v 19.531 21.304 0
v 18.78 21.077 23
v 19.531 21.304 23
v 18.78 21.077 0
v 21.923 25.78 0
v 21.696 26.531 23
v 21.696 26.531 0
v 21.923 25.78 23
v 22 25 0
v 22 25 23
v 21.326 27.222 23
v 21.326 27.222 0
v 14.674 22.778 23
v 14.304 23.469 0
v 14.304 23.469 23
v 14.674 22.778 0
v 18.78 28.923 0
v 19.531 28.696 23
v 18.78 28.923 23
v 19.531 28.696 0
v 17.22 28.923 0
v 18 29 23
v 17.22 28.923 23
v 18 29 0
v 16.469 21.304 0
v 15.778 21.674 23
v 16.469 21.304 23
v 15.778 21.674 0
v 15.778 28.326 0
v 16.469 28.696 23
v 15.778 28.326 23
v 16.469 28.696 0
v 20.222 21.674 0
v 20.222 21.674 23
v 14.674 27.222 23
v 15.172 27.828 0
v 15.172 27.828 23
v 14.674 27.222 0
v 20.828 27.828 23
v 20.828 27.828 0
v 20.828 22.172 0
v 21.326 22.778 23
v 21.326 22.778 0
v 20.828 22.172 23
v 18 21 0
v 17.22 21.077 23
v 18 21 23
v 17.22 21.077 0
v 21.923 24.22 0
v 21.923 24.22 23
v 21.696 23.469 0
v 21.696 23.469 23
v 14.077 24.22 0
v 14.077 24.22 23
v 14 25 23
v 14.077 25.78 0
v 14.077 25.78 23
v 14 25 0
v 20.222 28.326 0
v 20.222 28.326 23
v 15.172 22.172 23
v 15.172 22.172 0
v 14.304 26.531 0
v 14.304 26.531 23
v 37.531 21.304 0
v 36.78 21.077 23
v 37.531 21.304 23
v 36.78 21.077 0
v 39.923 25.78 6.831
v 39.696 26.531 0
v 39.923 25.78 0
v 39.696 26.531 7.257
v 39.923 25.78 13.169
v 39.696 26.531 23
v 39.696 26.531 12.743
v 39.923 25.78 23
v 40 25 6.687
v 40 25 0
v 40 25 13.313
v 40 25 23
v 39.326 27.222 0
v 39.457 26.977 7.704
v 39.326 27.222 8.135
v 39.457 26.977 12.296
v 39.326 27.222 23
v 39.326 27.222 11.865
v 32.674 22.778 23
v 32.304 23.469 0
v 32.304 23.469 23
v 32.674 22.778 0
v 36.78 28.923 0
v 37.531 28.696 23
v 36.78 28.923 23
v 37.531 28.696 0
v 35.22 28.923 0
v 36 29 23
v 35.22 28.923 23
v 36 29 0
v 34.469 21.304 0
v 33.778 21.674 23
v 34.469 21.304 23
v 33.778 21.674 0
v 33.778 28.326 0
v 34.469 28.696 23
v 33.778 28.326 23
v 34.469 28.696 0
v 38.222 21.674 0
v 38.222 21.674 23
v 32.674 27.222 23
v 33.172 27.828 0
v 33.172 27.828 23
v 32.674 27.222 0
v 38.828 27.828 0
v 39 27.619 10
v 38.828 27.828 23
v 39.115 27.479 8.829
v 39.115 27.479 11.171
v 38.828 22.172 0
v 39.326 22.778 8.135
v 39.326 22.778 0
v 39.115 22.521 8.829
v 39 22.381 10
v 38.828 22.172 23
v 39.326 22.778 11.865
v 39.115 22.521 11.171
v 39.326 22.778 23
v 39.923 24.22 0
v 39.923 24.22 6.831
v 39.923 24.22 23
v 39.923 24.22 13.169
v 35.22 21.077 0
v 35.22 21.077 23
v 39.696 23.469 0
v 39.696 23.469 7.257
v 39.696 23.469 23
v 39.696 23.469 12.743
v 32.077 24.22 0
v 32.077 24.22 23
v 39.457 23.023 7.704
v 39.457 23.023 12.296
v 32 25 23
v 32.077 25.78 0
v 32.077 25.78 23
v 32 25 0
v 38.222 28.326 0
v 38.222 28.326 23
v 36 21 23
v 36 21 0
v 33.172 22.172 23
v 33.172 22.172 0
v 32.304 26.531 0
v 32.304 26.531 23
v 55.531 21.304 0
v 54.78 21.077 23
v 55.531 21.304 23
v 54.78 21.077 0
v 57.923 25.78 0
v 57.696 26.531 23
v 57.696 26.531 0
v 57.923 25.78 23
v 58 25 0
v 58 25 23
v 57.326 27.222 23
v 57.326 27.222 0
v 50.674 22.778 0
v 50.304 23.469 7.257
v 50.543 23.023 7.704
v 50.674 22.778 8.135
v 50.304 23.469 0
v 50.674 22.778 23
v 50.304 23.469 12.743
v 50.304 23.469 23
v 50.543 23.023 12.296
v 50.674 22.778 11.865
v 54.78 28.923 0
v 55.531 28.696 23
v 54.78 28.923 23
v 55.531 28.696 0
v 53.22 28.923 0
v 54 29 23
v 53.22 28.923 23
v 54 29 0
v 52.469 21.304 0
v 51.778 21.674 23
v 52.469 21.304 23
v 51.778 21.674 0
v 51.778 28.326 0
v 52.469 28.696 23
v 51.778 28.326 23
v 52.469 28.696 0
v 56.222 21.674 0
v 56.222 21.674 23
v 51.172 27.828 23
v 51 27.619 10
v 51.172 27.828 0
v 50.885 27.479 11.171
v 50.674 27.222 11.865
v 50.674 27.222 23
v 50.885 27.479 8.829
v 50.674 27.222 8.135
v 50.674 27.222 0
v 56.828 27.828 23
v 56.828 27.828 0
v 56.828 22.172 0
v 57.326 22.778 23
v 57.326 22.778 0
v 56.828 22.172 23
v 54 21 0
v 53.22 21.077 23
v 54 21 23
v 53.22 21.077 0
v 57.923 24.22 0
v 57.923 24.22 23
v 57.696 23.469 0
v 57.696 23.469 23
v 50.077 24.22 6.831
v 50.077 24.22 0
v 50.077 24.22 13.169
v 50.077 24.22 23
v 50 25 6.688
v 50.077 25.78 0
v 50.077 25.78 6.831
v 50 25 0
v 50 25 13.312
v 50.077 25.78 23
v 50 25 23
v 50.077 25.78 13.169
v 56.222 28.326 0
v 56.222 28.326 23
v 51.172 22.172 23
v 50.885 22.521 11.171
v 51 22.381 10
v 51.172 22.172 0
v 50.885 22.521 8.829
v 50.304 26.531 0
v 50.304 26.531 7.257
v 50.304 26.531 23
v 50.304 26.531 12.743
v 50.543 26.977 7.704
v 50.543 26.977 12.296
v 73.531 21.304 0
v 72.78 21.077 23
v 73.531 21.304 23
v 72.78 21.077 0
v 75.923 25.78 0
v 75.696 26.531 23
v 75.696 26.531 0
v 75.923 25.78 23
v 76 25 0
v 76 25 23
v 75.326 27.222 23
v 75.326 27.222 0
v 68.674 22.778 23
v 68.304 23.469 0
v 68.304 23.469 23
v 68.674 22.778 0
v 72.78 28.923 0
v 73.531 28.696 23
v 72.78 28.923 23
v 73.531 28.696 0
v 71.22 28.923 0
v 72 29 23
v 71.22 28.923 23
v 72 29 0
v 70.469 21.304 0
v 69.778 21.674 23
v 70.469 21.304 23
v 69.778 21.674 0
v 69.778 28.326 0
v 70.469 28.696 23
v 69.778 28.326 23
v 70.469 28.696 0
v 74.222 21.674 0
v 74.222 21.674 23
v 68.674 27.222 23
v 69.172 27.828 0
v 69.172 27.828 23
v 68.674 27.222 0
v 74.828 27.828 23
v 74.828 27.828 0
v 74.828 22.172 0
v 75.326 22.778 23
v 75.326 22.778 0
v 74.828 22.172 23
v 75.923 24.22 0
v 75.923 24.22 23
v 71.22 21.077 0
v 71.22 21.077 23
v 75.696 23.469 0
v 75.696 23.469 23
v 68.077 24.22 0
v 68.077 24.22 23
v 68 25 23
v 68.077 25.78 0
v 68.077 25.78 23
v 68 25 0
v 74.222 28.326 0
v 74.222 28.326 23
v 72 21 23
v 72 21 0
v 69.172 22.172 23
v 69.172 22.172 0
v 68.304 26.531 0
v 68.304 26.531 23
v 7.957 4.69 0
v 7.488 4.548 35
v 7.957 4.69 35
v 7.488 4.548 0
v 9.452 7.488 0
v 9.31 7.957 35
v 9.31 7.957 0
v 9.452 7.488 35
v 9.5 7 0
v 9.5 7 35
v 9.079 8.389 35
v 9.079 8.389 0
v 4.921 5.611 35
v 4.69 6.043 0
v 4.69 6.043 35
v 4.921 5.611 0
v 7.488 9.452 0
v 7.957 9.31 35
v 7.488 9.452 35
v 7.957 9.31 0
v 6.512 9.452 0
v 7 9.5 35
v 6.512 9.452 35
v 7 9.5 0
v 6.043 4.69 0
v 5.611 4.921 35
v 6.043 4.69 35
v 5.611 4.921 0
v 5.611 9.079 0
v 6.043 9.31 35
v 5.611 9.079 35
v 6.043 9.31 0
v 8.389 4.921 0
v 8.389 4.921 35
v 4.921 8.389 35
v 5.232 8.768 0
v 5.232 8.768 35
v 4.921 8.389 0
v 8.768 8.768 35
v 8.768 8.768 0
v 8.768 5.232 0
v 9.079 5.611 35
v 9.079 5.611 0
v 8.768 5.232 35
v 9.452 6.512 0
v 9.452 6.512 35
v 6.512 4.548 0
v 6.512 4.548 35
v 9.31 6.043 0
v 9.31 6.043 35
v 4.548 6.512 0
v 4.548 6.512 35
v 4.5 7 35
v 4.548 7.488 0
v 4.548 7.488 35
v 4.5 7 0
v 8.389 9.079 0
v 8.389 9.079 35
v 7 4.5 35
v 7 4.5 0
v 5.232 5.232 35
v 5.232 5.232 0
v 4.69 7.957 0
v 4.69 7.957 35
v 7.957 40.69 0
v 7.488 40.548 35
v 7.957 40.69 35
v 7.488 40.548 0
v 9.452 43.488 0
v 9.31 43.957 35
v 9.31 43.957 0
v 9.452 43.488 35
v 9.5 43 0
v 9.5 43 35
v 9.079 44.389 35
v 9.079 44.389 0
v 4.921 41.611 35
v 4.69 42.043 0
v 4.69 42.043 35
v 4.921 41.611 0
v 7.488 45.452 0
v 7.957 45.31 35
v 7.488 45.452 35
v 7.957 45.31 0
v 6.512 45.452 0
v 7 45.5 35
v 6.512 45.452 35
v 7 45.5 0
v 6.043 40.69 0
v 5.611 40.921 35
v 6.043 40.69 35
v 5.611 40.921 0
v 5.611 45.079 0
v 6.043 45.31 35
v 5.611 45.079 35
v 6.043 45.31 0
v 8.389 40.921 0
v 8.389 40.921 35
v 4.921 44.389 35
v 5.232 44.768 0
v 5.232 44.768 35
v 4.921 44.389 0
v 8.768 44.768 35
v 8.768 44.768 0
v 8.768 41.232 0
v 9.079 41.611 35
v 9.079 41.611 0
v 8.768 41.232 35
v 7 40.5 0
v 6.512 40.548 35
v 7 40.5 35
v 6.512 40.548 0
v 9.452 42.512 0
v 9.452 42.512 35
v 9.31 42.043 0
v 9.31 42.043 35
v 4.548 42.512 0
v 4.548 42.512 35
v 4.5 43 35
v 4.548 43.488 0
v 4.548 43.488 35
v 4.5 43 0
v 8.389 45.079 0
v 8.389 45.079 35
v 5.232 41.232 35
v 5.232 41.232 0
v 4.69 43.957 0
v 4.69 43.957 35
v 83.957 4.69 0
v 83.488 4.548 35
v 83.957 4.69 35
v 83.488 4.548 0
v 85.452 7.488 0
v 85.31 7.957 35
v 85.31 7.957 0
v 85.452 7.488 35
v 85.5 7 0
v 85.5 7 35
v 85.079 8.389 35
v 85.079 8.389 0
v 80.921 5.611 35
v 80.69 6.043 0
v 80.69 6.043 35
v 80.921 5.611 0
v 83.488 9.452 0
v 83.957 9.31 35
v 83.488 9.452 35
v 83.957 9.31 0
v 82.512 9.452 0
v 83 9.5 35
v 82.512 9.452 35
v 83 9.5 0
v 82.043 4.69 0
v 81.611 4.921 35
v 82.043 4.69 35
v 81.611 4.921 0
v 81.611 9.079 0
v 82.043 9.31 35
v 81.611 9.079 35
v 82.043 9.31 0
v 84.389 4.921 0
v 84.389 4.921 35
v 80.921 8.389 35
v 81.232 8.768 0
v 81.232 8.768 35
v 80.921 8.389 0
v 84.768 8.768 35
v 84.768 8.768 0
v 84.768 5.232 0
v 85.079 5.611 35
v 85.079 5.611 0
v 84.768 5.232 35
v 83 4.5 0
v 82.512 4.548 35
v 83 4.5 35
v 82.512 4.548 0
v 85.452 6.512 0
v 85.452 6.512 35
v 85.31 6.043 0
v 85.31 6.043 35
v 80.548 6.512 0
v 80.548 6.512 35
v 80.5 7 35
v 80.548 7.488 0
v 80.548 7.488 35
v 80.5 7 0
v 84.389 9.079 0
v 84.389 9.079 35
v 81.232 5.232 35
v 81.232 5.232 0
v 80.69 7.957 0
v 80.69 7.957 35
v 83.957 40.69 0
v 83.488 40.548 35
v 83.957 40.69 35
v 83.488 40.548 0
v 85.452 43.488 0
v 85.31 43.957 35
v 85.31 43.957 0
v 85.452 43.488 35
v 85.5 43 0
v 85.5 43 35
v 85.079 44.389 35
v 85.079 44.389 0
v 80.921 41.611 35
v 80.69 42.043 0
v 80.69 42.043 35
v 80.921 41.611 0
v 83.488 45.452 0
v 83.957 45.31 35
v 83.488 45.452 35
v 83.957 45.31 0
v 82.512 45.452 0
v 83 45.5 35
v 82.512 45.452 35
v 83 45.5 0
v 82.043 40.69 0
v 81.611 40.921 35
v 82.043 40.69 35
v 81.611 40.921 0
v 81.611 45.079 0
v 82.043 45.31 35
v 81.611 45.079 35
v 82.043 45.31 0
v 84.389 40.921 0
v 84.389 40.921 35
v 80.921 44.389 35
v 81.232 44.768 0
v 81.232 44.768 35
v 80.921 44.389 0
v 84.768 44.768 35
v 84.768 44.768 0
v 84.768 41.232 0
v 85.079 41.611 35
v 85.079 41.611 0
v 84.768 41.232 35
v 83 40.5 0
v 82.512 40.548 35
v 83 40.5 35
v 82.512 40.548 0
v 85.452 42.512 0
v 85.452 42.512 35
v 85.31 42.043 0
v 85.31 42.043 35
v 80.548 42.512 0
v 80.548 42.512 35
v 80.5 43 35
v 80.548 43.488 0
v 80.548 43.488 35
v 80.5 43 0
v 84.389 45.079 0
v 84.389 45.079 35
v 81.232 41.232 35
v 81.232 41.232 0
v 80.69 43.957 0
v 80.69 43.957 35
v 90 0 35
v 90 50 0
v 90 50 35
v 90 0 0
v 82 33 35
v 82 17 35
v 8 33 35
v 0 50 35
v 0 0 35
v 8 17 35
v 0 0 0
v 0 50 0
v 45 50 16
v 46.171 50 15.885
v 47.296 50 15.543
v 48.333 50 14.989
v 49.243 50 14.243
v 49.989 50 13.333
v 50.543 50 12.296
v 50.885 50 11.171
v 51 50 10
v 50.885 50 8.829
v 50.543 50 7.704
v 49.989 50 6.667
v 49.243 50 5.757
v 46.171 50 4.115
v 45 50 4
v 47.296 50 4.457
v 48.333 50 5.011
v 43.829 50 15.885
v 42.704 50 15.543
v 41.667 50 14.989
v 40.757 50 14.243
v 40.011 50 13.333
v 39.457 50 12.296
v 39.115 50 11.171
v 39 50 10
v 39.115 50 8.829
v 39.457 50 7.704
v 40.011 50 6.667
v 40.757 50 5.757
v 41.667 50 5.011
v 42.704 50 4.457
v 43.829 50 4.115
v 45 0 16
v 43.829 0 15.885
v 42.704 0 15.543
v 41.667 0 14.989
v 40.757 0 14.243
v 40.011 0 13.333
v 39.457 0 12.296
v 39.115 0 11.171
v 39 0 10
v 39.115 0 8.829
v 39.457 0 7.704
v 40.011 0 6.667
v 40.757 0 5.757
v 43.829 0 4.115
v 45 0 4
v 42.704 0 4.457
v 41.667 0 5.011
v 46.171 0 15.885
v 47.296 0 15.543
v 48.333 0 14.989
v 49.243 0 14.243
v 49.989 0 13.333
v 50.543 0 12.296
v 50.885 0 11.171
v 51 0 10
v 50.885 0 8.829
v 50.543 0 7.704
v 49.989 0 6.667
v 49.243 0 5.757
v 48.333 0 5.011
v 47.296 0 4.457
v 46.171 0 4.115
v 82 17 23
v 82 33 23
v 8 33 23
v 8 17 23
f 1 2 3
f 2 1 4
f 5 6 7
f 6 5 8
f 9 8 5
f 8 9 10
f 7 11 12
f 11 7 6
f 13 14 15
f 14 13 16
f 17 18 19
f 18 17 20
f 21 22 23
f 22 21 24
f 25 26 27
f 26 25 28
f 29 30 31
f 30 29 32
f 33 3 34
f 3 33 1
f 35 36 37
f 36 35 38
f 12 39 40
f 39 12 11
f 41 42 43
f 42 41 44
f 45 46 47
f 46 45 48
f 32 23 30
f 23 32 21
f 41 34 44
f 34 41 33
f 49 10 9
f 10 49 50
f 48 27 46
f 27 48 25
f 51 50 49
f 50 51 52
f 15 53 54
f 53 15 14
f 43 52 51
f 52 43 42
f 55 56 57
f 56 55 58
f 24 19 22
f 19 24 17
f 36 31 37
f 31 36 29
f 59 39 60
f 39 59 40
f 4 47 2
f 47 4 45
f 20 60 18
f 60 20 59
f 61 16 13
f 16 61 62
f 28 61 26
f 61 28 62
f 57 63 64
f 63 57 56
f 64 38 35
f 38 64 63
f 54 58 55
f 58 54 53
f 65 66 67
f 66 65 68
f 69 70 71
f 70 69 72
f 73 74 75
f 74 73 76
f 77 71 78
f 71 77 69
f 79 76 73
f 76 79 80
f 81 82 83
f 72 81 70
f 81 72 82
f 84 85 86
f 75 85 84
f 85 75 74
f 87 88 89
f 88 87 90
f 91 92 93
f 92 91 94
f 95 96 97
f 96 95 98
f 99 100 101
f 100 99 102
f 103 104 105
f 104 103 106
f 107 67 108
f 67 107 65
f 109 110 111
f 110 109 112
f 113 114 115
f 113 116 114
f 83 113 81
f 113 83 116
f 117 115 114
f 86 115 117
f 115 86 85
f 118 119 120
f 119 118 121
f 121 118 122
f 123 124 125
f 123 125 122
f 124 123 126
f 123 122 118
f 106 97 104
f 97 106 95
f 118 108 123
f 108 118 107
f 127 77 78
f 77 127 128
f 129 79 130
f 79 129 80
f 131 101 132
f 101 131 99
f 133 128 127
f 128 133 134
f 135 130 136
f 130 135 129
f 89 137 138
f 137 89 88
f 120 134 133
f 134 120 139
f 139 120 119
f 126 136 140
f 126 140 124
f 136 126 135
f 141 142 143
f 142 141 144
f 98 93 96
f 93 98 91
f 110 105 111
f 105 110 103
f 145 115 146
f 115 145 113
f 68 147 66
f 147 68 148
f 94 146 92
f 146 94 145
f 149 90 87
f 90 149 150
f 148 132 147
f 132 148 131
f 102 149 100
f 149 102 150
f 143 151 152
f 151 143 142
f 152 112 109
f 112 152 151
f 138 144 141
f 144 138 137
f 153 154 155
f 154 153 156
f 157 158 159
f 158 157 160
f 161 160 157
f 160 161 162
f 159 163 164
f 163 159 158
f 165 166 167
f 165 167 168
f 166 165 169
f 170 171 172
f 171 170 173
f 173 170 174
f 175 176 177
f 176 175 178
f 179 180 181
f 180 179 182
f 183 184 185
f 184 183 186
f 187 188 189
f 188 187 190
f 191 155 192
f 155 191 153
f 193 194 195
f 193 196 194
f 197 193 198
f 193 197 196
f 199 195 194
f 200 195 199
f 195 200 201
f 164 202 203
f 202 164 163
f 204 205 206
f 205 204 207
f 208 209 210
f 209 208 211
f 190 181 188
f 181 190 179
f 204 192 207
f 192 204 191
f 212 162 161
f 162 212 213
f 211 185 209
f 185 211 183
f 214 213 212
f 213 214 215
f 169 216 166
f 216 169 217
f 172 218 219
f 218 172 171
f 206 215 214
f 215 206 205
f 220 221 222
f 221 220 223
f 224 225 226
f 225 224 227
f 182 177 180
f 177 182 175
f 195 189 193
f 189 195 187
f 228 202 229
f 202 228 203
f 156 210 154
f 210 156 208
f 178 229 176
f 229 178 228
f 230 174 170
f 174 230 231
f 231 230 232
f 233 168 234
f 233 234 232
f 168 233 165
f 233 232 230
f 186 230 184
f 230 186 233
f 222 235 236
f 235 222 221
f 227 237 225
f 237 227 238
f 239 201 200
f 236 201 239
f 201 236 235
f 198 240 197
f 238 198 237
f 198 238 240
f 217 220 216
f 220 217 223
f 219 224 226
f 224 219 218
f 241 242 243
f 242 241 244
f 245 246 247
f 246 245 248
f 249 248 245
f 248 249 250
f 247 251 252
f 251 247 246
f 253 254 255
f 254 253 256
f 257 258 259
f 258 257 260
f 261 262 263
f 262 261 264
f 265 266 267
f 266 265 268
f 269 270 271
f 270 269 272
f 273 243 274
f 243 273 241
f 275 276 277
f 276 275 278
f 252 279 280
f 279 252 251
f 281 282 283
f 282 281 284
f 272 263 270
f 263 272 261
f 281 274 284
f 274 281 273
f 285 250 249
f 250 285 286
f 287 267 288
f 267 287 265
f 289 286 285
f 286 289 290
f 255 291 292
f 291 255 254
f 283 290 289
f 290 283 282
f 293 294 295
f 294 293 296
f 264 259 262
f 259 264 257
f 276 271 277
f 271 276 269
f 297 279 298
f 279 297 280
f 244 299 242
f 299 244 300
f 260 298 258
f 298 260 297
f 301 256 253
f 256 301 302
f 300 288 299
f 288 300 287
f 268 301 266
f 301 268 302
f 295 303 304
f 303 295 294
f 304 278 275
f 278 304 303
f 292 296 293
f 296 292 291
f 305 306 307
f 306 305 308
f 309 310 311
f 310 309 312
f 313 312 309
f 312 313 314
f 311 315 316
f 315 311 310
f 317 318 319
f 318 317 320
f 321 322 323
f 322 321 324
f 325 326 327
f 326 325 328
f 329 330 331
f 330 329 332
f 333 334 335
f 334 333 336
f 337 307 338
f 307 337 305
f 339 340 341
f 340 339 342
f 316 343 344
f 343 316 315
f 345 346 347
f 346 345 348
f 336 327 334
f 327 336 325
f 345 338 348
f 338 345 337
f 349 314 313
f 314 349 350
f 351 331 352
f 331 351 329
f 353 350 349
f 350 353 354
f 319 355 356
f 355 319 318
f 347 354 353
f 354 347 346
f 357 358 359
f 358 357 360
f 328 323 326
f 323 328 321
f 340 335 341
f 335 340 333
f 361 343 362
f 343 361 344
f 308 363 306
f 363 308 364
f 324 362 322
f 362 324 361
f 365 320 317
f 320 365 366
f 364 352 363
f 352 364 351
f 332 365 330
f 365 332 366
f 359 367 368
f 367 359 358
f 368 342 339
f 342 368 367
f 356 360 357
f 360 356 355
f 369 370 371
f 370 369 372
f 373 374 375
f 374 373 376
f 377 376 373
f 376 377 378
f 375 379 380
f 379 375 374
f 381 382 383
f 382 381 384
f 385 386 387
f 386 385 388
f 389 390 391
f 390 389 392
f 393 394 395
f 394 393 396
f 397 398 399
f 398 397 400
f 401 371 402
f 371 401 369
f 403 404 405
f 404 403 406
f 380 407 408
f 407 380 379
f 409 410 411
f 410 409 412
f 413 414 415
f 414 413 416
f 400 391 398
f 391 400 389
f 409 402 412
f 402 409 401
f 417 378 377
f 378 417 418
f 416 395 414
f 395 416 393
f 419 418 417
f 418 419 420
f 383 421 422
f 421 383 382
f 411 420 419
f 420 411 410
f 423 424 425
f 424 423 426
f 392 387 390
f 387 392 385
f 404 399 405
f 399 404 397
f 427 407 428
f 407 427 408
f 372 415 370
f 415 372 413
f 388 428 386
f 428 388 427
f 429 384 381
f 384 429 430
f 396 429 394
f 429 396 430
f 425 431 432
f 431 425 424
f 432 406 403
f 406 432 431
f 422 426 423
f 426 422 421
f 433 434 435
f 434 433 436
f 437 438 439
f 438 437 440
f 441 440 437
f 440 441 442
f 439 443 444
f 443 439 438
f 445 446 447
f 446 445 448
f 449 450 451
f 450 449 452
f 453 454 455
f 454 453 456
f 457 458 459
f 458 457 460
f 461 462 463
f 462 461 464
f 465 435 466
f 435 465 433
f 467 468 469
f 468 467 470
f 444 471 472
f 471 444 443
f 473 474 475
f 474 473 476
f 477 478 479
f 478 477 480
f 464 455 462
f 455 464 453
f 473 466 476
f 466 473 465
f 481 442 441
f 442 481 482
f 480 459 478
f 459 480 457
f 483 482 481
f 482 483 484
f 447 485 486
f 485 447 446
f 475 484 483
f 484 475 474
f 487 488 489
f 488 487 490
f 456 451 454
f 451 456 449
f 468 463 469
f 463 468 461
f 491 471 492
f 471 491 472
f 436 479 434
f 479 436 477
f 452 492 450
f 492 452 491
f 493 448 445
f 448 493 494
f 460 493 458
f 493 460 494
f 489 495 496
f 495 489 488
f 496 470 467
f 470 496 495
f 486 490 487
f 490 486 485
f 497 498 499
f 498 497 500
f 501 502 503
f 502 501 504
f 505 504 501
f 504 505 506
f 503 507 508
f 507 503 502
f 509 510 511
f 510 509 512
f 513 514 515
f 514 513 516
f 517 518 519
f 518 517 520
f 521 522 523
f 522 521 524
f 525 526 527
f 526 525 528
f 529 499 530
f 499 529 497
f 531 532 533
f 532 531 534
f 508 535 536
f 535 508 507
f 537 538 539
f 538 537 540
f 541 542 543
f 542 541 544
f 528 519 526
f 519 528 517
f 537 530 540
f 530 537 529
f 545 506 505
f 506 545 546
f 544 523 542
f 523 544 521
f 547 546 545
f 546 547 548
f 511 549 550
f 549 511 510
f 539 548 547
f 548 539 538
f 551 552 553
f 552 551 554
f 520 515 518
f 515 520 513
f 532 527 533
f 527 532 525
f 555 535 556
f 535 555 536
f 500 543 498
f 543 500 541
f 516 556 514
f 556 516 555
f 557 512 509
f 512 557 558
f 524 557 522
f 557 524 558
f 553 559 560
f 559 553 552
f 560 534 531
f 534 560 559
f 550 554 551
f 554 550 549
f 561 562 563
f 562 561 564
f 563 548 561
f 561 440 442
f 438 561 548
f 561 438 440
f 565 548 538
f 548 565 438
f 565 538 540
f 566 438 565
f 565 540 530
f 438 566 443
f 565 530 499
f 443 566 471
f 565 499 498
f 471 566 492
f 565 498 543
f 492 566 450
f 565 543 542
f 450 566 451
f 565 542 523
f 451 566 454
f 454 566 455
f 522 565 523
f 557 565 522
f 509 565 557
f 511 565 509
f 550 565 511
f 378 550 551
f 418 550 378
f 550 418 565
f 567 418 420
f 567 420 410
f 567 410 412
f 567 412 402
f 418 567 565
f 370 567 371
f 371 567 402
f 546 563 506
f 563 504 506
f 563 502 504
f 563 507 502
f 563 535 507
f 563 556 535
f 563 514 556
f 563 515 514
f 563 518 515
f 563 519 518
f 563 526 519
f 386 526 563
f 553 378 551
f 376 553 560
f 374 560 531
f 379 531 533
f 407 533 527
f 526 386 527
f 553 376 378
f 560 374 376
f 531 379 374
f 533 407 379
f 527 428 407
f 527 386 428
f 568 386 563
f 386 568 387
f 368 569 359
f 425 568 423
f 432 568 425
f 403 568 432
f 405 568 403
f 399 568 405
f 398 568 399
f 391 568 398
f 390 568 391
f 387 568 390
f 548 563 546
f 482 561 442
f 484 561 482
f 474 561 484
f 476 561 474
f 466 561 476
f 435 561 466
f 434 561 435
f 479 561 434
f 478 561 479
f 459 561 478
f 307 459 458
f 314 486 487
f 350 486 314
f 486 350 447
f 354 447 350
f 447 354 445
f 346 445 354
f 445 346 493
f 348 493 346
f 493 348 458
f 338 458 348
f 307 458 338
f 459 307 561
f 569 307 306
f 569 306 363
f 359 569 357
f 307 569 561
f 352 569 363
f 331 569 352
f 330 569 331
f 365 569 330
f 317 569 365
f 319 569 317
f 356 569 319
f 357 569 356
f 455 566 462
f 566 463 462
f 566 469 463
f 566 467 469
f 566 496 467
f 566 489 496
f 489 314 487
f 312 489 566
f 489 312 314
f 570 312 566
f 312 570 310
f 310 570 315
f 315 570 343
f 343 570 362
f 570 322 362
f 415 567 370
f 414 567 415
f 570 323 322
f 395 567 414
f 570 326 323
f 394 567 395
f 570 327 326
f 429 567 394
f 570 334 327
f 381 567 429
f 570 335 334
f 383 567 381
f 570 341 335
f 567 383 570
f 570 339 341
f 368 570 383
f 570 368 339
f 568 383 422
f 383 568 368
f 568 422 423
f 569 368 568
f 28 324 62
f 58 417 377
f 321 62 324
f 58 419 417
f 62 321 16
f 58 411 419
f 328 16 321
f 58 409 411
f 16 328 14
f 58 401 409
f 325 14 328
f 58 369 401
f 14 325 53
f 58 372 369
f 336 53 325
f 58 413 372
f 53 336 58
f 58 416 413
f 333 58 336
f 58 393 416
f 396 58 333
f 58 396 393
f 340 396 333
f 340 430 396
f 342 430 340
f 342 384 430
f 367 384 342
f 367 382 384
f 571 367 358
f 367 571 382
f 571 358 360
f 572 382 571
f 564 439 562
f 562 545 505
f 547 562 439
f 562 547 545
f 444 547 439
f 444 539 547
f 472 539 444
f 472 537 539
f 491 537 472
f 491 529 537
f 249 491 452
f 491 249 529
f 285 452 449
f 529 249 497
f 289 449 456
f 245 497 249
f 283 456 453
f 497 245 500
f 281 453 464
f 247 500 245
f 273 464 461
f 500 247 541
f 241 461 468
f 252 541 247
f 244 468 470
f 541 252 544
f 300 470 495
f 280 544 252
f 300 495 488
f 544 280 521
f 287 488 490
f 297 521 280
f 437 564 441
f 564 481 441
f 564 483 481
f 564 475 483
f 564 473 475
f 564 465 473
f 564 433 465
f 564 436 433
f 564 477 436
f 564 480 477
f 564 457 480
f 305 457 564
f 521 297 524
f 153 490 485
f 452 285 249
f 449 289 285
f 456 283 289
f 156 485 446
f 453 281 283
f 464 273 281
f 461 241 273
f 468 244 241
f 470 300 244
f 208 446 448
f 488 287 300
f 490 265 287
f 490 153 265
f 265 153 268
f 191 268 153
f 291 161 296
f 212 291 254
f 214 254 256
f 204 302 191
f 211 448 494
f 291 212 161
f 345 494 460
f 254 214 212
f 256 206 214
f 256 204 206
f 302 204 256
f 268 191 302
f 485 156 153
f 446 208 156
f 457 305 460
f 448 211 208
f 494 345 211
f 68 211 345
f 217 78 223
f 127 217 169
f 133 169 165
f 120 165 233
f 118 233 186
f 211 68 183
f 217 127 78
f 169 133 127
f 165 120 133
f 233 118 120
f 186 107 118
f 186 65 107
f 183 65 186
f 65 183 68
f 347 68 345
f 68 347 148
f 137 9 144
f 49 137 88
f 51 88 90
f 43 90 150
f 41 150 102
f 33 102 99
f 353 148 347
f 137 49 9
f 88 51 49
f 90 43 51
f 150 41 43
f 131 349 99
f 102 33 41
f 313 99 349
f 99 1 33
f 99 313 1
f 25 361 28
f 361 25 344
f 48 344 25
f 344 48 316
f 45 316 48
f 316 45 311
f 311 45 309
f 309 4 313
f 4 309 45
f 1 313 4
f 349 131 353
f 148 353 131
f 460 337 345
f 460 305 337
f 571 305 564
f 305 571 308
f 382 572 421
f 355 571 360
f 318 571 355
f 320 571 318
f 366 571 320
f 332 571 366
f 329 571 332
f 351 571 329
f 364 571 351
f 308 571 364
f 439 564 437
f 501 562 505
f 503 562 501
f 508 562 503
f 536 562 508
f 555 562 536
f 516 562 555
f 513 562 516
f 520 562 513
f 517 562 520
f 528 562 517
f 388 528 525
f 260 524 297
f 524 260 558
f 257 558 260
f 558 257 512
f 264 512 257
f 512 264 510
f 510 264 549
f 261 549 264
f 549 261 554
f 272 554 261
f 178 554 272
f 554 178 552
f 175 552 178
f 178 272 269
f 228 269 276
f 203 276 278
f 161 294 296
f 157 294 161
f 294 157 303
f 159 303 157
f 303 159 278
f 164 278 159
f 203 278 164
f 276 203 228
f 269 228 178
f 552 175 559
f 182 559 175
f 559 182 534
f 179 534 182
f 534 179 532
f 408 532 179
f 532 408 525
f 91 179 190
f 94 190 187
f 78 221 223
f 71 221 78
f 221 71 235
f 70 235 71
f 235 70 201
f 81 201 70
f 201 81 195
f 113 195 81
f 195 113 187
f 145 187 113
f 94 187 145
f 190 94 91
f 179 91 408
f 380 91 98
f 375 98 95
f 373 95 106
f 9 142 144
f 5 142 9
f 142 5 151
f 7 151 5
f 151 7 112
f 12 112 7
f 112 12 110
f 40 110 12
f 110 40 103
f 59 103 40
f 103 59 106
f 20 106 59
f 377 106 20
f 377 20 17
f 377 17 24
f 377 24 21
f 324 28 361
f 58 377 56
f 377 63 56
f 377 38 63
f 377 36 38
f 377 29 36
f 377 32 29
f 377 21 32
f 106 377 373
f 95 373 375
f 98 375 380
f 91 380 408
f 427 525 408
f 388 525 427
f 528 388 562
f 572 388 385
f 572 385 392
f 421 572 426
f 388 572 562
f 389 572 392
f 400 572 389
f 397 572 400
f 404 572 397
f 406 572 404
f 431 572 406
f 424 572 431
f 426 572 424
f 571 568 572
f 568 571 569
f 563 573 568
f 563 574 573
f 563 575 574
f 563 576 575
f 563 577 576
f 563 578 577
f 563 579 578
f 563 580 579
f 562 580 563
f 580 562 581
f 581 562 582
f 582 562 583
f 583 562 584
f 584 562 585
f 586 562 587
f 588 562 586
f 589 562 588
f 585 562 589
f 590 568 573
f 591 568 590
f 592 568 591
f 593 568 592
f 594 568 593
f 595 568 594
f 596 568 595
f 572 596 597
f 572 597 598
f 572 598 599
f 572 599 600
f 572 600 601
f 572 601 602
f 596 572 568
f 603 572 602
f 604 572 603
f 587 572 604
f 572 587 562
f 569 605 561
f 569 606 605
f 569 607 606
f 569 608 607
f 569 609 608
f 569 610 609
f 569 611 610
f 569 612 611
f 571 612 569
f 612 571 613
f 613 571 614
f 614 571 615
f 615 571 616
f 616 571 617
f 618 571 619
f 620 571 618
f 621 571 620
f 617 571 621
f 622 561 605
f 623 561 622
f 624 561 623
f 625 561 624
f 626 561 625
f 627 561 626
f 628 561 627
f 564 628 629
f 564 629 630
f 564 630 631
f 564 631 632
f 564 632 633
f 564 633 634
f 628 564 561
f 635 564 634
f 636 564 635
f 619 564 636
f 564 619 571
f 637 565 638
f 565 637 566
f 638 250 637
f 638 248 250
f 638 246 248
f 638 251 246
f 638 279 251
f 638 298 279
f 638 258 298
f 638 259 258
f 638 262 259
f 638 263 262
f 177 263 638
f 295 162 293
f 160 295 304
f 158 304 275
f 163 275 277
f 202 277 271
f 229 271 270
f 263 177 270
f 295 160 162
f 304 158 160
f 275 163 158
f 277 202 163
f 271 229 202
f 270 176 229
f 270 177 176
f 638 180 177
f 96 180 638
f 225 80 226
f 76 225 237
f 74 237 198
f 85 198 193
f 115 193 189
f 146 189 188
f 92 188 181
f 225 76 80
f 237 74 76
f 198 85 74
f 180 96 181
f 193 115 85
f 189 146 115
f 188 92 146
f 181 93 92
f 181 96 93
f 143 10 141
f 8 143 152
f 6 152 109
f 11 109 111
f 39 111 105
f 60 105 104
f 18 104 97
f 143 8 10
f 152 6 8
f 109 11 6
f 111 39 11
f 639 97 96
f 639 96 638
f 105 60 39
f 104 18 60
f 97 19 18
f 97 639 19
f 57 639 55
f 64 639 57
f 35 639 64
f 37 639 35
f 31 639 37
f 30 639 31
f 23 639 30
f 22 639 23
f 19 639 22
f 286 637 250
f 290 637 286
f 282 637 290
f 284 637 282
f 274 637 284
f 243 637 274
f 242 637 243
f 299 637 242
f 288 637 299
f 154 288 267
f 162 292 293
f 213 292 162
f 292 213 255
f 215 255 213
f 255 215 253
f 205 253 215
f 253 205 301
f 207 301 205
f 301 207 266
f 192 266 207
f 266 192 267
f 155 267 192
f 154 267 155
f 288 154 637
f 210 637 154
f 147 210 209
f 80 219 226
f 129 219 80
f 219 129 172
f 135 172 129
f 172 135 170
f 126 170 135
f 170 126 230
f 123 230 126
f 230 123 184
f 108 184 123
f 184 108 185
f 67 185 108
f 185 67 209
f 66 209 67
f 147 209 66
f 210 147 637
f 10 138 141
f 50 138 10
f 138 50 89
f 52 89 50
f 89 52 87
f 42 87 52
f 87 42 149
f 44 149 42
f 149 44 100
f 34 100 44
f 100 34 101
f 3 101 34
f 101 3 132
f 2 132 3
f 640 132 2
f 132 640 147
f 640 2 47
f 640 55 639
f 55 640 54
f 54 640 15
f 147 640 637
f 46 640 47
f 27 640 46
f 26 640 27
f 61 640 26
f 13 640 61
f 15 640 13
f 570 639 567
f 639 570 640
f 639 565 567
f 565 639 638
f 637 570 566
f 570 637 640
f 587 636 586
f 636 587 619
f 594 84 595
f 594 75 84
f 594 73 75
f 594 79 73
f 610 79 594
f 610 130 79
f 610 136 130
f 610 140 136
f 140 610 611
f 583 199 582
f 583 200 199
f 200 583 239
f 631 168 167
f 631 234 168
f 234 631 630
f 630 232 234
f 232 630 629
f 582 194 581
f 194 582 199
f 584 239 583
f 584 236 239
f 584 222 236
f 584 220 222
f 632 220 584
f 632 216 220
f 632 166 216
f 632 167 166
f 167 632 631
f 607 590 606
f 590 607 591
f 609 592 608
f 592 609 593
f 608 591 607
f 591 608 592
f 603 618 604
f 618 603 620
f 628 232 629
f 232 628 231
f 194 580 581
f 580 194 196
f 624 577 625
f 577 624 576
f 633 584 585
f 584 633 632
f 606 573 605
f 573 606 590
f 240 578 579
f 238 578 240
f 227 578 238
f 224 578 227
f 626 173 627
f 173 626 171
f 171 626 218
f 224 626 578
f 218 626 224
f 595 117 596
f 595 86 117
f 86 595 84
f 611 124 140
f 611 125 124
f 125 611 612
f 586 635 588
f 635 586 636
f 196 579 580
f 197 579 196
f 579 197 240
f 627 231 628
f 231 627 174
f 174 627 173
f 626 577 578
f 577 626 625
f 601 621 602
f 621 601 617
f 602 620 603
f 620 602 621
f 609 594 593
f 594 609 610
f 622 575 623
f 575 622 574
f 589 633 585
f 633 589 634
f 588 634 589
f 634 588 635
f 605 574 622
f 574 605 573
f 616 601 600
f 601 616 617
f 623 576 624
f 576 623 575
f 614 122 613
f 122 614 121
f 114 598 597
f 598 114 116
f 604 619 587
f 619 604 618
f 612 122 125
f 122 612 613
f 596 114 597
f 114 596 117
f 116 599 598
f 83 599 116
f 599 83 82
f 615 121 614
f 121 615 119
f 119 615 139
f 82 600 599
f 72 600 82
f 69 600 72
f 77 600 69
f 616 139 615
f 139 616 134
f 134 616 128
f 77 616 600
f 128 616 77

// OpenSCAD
$fn = 32;

// ----------------------------------------------------------------------
// Manifold block: side_outlet manifold
// ----------------------------------------------------------------------

// --- parameters (mm) ---
block_l = 90;             // block length, X
block_w = 50;             // block width, Y
block_h = 35;             // block height, Z
port_d = 8;               // port bore diameter
port_pitch = 18;          // port pitch along X
gallery_d = 16;           // top gallery width, Y
gallery_depth = 12;       // gallery pocket depth
wall_p = 8;               // gallery end wall thickness, X
mnt_d = 5;                // mounting hole diameter
mnt_in = 7;               // mounting hole inset from the edges
out_d = 12;               // outlet bore diameter
out_z = 10;               // outlet axis height
fit_tol = 0.02;           // tolerance for press fits, mm
free_tol = 0.2;           // tolerance for clearance fits, mm

n_ports = 4;  // ports in the row
port_x0 = (block_l - (n_ports - 1) * port_pitch) / 2;  // first port X

difference() {
  cube([block_l, block_w, block_h]);
  for (i = [0 : n_ports - 1])
    translate([port_x0 + i * port_pitch, block_w / 2, -1])
      cylinder(h = block_h + 2, d = port_d);
  translate([wall_p, block_w / 2 - gallery_d / 2, block_h - gallery_depth])
    cube([block_l - 2 * wall_p, gallery_d, gallery_depth + 1]);
  for (cx = [mnt_in, block_l - mnt_in])
    for (cy = [mnt_in, block_w - mnt_in])
      translate([cx, cy, -1]) cylinder(h = block_h + 2, d = mnt_d);
  translate([block_l / 2, -1, out_z]) rotate([-90, 0, 0])
    cylinder(h = block_w + 2, d = out_d);
}
